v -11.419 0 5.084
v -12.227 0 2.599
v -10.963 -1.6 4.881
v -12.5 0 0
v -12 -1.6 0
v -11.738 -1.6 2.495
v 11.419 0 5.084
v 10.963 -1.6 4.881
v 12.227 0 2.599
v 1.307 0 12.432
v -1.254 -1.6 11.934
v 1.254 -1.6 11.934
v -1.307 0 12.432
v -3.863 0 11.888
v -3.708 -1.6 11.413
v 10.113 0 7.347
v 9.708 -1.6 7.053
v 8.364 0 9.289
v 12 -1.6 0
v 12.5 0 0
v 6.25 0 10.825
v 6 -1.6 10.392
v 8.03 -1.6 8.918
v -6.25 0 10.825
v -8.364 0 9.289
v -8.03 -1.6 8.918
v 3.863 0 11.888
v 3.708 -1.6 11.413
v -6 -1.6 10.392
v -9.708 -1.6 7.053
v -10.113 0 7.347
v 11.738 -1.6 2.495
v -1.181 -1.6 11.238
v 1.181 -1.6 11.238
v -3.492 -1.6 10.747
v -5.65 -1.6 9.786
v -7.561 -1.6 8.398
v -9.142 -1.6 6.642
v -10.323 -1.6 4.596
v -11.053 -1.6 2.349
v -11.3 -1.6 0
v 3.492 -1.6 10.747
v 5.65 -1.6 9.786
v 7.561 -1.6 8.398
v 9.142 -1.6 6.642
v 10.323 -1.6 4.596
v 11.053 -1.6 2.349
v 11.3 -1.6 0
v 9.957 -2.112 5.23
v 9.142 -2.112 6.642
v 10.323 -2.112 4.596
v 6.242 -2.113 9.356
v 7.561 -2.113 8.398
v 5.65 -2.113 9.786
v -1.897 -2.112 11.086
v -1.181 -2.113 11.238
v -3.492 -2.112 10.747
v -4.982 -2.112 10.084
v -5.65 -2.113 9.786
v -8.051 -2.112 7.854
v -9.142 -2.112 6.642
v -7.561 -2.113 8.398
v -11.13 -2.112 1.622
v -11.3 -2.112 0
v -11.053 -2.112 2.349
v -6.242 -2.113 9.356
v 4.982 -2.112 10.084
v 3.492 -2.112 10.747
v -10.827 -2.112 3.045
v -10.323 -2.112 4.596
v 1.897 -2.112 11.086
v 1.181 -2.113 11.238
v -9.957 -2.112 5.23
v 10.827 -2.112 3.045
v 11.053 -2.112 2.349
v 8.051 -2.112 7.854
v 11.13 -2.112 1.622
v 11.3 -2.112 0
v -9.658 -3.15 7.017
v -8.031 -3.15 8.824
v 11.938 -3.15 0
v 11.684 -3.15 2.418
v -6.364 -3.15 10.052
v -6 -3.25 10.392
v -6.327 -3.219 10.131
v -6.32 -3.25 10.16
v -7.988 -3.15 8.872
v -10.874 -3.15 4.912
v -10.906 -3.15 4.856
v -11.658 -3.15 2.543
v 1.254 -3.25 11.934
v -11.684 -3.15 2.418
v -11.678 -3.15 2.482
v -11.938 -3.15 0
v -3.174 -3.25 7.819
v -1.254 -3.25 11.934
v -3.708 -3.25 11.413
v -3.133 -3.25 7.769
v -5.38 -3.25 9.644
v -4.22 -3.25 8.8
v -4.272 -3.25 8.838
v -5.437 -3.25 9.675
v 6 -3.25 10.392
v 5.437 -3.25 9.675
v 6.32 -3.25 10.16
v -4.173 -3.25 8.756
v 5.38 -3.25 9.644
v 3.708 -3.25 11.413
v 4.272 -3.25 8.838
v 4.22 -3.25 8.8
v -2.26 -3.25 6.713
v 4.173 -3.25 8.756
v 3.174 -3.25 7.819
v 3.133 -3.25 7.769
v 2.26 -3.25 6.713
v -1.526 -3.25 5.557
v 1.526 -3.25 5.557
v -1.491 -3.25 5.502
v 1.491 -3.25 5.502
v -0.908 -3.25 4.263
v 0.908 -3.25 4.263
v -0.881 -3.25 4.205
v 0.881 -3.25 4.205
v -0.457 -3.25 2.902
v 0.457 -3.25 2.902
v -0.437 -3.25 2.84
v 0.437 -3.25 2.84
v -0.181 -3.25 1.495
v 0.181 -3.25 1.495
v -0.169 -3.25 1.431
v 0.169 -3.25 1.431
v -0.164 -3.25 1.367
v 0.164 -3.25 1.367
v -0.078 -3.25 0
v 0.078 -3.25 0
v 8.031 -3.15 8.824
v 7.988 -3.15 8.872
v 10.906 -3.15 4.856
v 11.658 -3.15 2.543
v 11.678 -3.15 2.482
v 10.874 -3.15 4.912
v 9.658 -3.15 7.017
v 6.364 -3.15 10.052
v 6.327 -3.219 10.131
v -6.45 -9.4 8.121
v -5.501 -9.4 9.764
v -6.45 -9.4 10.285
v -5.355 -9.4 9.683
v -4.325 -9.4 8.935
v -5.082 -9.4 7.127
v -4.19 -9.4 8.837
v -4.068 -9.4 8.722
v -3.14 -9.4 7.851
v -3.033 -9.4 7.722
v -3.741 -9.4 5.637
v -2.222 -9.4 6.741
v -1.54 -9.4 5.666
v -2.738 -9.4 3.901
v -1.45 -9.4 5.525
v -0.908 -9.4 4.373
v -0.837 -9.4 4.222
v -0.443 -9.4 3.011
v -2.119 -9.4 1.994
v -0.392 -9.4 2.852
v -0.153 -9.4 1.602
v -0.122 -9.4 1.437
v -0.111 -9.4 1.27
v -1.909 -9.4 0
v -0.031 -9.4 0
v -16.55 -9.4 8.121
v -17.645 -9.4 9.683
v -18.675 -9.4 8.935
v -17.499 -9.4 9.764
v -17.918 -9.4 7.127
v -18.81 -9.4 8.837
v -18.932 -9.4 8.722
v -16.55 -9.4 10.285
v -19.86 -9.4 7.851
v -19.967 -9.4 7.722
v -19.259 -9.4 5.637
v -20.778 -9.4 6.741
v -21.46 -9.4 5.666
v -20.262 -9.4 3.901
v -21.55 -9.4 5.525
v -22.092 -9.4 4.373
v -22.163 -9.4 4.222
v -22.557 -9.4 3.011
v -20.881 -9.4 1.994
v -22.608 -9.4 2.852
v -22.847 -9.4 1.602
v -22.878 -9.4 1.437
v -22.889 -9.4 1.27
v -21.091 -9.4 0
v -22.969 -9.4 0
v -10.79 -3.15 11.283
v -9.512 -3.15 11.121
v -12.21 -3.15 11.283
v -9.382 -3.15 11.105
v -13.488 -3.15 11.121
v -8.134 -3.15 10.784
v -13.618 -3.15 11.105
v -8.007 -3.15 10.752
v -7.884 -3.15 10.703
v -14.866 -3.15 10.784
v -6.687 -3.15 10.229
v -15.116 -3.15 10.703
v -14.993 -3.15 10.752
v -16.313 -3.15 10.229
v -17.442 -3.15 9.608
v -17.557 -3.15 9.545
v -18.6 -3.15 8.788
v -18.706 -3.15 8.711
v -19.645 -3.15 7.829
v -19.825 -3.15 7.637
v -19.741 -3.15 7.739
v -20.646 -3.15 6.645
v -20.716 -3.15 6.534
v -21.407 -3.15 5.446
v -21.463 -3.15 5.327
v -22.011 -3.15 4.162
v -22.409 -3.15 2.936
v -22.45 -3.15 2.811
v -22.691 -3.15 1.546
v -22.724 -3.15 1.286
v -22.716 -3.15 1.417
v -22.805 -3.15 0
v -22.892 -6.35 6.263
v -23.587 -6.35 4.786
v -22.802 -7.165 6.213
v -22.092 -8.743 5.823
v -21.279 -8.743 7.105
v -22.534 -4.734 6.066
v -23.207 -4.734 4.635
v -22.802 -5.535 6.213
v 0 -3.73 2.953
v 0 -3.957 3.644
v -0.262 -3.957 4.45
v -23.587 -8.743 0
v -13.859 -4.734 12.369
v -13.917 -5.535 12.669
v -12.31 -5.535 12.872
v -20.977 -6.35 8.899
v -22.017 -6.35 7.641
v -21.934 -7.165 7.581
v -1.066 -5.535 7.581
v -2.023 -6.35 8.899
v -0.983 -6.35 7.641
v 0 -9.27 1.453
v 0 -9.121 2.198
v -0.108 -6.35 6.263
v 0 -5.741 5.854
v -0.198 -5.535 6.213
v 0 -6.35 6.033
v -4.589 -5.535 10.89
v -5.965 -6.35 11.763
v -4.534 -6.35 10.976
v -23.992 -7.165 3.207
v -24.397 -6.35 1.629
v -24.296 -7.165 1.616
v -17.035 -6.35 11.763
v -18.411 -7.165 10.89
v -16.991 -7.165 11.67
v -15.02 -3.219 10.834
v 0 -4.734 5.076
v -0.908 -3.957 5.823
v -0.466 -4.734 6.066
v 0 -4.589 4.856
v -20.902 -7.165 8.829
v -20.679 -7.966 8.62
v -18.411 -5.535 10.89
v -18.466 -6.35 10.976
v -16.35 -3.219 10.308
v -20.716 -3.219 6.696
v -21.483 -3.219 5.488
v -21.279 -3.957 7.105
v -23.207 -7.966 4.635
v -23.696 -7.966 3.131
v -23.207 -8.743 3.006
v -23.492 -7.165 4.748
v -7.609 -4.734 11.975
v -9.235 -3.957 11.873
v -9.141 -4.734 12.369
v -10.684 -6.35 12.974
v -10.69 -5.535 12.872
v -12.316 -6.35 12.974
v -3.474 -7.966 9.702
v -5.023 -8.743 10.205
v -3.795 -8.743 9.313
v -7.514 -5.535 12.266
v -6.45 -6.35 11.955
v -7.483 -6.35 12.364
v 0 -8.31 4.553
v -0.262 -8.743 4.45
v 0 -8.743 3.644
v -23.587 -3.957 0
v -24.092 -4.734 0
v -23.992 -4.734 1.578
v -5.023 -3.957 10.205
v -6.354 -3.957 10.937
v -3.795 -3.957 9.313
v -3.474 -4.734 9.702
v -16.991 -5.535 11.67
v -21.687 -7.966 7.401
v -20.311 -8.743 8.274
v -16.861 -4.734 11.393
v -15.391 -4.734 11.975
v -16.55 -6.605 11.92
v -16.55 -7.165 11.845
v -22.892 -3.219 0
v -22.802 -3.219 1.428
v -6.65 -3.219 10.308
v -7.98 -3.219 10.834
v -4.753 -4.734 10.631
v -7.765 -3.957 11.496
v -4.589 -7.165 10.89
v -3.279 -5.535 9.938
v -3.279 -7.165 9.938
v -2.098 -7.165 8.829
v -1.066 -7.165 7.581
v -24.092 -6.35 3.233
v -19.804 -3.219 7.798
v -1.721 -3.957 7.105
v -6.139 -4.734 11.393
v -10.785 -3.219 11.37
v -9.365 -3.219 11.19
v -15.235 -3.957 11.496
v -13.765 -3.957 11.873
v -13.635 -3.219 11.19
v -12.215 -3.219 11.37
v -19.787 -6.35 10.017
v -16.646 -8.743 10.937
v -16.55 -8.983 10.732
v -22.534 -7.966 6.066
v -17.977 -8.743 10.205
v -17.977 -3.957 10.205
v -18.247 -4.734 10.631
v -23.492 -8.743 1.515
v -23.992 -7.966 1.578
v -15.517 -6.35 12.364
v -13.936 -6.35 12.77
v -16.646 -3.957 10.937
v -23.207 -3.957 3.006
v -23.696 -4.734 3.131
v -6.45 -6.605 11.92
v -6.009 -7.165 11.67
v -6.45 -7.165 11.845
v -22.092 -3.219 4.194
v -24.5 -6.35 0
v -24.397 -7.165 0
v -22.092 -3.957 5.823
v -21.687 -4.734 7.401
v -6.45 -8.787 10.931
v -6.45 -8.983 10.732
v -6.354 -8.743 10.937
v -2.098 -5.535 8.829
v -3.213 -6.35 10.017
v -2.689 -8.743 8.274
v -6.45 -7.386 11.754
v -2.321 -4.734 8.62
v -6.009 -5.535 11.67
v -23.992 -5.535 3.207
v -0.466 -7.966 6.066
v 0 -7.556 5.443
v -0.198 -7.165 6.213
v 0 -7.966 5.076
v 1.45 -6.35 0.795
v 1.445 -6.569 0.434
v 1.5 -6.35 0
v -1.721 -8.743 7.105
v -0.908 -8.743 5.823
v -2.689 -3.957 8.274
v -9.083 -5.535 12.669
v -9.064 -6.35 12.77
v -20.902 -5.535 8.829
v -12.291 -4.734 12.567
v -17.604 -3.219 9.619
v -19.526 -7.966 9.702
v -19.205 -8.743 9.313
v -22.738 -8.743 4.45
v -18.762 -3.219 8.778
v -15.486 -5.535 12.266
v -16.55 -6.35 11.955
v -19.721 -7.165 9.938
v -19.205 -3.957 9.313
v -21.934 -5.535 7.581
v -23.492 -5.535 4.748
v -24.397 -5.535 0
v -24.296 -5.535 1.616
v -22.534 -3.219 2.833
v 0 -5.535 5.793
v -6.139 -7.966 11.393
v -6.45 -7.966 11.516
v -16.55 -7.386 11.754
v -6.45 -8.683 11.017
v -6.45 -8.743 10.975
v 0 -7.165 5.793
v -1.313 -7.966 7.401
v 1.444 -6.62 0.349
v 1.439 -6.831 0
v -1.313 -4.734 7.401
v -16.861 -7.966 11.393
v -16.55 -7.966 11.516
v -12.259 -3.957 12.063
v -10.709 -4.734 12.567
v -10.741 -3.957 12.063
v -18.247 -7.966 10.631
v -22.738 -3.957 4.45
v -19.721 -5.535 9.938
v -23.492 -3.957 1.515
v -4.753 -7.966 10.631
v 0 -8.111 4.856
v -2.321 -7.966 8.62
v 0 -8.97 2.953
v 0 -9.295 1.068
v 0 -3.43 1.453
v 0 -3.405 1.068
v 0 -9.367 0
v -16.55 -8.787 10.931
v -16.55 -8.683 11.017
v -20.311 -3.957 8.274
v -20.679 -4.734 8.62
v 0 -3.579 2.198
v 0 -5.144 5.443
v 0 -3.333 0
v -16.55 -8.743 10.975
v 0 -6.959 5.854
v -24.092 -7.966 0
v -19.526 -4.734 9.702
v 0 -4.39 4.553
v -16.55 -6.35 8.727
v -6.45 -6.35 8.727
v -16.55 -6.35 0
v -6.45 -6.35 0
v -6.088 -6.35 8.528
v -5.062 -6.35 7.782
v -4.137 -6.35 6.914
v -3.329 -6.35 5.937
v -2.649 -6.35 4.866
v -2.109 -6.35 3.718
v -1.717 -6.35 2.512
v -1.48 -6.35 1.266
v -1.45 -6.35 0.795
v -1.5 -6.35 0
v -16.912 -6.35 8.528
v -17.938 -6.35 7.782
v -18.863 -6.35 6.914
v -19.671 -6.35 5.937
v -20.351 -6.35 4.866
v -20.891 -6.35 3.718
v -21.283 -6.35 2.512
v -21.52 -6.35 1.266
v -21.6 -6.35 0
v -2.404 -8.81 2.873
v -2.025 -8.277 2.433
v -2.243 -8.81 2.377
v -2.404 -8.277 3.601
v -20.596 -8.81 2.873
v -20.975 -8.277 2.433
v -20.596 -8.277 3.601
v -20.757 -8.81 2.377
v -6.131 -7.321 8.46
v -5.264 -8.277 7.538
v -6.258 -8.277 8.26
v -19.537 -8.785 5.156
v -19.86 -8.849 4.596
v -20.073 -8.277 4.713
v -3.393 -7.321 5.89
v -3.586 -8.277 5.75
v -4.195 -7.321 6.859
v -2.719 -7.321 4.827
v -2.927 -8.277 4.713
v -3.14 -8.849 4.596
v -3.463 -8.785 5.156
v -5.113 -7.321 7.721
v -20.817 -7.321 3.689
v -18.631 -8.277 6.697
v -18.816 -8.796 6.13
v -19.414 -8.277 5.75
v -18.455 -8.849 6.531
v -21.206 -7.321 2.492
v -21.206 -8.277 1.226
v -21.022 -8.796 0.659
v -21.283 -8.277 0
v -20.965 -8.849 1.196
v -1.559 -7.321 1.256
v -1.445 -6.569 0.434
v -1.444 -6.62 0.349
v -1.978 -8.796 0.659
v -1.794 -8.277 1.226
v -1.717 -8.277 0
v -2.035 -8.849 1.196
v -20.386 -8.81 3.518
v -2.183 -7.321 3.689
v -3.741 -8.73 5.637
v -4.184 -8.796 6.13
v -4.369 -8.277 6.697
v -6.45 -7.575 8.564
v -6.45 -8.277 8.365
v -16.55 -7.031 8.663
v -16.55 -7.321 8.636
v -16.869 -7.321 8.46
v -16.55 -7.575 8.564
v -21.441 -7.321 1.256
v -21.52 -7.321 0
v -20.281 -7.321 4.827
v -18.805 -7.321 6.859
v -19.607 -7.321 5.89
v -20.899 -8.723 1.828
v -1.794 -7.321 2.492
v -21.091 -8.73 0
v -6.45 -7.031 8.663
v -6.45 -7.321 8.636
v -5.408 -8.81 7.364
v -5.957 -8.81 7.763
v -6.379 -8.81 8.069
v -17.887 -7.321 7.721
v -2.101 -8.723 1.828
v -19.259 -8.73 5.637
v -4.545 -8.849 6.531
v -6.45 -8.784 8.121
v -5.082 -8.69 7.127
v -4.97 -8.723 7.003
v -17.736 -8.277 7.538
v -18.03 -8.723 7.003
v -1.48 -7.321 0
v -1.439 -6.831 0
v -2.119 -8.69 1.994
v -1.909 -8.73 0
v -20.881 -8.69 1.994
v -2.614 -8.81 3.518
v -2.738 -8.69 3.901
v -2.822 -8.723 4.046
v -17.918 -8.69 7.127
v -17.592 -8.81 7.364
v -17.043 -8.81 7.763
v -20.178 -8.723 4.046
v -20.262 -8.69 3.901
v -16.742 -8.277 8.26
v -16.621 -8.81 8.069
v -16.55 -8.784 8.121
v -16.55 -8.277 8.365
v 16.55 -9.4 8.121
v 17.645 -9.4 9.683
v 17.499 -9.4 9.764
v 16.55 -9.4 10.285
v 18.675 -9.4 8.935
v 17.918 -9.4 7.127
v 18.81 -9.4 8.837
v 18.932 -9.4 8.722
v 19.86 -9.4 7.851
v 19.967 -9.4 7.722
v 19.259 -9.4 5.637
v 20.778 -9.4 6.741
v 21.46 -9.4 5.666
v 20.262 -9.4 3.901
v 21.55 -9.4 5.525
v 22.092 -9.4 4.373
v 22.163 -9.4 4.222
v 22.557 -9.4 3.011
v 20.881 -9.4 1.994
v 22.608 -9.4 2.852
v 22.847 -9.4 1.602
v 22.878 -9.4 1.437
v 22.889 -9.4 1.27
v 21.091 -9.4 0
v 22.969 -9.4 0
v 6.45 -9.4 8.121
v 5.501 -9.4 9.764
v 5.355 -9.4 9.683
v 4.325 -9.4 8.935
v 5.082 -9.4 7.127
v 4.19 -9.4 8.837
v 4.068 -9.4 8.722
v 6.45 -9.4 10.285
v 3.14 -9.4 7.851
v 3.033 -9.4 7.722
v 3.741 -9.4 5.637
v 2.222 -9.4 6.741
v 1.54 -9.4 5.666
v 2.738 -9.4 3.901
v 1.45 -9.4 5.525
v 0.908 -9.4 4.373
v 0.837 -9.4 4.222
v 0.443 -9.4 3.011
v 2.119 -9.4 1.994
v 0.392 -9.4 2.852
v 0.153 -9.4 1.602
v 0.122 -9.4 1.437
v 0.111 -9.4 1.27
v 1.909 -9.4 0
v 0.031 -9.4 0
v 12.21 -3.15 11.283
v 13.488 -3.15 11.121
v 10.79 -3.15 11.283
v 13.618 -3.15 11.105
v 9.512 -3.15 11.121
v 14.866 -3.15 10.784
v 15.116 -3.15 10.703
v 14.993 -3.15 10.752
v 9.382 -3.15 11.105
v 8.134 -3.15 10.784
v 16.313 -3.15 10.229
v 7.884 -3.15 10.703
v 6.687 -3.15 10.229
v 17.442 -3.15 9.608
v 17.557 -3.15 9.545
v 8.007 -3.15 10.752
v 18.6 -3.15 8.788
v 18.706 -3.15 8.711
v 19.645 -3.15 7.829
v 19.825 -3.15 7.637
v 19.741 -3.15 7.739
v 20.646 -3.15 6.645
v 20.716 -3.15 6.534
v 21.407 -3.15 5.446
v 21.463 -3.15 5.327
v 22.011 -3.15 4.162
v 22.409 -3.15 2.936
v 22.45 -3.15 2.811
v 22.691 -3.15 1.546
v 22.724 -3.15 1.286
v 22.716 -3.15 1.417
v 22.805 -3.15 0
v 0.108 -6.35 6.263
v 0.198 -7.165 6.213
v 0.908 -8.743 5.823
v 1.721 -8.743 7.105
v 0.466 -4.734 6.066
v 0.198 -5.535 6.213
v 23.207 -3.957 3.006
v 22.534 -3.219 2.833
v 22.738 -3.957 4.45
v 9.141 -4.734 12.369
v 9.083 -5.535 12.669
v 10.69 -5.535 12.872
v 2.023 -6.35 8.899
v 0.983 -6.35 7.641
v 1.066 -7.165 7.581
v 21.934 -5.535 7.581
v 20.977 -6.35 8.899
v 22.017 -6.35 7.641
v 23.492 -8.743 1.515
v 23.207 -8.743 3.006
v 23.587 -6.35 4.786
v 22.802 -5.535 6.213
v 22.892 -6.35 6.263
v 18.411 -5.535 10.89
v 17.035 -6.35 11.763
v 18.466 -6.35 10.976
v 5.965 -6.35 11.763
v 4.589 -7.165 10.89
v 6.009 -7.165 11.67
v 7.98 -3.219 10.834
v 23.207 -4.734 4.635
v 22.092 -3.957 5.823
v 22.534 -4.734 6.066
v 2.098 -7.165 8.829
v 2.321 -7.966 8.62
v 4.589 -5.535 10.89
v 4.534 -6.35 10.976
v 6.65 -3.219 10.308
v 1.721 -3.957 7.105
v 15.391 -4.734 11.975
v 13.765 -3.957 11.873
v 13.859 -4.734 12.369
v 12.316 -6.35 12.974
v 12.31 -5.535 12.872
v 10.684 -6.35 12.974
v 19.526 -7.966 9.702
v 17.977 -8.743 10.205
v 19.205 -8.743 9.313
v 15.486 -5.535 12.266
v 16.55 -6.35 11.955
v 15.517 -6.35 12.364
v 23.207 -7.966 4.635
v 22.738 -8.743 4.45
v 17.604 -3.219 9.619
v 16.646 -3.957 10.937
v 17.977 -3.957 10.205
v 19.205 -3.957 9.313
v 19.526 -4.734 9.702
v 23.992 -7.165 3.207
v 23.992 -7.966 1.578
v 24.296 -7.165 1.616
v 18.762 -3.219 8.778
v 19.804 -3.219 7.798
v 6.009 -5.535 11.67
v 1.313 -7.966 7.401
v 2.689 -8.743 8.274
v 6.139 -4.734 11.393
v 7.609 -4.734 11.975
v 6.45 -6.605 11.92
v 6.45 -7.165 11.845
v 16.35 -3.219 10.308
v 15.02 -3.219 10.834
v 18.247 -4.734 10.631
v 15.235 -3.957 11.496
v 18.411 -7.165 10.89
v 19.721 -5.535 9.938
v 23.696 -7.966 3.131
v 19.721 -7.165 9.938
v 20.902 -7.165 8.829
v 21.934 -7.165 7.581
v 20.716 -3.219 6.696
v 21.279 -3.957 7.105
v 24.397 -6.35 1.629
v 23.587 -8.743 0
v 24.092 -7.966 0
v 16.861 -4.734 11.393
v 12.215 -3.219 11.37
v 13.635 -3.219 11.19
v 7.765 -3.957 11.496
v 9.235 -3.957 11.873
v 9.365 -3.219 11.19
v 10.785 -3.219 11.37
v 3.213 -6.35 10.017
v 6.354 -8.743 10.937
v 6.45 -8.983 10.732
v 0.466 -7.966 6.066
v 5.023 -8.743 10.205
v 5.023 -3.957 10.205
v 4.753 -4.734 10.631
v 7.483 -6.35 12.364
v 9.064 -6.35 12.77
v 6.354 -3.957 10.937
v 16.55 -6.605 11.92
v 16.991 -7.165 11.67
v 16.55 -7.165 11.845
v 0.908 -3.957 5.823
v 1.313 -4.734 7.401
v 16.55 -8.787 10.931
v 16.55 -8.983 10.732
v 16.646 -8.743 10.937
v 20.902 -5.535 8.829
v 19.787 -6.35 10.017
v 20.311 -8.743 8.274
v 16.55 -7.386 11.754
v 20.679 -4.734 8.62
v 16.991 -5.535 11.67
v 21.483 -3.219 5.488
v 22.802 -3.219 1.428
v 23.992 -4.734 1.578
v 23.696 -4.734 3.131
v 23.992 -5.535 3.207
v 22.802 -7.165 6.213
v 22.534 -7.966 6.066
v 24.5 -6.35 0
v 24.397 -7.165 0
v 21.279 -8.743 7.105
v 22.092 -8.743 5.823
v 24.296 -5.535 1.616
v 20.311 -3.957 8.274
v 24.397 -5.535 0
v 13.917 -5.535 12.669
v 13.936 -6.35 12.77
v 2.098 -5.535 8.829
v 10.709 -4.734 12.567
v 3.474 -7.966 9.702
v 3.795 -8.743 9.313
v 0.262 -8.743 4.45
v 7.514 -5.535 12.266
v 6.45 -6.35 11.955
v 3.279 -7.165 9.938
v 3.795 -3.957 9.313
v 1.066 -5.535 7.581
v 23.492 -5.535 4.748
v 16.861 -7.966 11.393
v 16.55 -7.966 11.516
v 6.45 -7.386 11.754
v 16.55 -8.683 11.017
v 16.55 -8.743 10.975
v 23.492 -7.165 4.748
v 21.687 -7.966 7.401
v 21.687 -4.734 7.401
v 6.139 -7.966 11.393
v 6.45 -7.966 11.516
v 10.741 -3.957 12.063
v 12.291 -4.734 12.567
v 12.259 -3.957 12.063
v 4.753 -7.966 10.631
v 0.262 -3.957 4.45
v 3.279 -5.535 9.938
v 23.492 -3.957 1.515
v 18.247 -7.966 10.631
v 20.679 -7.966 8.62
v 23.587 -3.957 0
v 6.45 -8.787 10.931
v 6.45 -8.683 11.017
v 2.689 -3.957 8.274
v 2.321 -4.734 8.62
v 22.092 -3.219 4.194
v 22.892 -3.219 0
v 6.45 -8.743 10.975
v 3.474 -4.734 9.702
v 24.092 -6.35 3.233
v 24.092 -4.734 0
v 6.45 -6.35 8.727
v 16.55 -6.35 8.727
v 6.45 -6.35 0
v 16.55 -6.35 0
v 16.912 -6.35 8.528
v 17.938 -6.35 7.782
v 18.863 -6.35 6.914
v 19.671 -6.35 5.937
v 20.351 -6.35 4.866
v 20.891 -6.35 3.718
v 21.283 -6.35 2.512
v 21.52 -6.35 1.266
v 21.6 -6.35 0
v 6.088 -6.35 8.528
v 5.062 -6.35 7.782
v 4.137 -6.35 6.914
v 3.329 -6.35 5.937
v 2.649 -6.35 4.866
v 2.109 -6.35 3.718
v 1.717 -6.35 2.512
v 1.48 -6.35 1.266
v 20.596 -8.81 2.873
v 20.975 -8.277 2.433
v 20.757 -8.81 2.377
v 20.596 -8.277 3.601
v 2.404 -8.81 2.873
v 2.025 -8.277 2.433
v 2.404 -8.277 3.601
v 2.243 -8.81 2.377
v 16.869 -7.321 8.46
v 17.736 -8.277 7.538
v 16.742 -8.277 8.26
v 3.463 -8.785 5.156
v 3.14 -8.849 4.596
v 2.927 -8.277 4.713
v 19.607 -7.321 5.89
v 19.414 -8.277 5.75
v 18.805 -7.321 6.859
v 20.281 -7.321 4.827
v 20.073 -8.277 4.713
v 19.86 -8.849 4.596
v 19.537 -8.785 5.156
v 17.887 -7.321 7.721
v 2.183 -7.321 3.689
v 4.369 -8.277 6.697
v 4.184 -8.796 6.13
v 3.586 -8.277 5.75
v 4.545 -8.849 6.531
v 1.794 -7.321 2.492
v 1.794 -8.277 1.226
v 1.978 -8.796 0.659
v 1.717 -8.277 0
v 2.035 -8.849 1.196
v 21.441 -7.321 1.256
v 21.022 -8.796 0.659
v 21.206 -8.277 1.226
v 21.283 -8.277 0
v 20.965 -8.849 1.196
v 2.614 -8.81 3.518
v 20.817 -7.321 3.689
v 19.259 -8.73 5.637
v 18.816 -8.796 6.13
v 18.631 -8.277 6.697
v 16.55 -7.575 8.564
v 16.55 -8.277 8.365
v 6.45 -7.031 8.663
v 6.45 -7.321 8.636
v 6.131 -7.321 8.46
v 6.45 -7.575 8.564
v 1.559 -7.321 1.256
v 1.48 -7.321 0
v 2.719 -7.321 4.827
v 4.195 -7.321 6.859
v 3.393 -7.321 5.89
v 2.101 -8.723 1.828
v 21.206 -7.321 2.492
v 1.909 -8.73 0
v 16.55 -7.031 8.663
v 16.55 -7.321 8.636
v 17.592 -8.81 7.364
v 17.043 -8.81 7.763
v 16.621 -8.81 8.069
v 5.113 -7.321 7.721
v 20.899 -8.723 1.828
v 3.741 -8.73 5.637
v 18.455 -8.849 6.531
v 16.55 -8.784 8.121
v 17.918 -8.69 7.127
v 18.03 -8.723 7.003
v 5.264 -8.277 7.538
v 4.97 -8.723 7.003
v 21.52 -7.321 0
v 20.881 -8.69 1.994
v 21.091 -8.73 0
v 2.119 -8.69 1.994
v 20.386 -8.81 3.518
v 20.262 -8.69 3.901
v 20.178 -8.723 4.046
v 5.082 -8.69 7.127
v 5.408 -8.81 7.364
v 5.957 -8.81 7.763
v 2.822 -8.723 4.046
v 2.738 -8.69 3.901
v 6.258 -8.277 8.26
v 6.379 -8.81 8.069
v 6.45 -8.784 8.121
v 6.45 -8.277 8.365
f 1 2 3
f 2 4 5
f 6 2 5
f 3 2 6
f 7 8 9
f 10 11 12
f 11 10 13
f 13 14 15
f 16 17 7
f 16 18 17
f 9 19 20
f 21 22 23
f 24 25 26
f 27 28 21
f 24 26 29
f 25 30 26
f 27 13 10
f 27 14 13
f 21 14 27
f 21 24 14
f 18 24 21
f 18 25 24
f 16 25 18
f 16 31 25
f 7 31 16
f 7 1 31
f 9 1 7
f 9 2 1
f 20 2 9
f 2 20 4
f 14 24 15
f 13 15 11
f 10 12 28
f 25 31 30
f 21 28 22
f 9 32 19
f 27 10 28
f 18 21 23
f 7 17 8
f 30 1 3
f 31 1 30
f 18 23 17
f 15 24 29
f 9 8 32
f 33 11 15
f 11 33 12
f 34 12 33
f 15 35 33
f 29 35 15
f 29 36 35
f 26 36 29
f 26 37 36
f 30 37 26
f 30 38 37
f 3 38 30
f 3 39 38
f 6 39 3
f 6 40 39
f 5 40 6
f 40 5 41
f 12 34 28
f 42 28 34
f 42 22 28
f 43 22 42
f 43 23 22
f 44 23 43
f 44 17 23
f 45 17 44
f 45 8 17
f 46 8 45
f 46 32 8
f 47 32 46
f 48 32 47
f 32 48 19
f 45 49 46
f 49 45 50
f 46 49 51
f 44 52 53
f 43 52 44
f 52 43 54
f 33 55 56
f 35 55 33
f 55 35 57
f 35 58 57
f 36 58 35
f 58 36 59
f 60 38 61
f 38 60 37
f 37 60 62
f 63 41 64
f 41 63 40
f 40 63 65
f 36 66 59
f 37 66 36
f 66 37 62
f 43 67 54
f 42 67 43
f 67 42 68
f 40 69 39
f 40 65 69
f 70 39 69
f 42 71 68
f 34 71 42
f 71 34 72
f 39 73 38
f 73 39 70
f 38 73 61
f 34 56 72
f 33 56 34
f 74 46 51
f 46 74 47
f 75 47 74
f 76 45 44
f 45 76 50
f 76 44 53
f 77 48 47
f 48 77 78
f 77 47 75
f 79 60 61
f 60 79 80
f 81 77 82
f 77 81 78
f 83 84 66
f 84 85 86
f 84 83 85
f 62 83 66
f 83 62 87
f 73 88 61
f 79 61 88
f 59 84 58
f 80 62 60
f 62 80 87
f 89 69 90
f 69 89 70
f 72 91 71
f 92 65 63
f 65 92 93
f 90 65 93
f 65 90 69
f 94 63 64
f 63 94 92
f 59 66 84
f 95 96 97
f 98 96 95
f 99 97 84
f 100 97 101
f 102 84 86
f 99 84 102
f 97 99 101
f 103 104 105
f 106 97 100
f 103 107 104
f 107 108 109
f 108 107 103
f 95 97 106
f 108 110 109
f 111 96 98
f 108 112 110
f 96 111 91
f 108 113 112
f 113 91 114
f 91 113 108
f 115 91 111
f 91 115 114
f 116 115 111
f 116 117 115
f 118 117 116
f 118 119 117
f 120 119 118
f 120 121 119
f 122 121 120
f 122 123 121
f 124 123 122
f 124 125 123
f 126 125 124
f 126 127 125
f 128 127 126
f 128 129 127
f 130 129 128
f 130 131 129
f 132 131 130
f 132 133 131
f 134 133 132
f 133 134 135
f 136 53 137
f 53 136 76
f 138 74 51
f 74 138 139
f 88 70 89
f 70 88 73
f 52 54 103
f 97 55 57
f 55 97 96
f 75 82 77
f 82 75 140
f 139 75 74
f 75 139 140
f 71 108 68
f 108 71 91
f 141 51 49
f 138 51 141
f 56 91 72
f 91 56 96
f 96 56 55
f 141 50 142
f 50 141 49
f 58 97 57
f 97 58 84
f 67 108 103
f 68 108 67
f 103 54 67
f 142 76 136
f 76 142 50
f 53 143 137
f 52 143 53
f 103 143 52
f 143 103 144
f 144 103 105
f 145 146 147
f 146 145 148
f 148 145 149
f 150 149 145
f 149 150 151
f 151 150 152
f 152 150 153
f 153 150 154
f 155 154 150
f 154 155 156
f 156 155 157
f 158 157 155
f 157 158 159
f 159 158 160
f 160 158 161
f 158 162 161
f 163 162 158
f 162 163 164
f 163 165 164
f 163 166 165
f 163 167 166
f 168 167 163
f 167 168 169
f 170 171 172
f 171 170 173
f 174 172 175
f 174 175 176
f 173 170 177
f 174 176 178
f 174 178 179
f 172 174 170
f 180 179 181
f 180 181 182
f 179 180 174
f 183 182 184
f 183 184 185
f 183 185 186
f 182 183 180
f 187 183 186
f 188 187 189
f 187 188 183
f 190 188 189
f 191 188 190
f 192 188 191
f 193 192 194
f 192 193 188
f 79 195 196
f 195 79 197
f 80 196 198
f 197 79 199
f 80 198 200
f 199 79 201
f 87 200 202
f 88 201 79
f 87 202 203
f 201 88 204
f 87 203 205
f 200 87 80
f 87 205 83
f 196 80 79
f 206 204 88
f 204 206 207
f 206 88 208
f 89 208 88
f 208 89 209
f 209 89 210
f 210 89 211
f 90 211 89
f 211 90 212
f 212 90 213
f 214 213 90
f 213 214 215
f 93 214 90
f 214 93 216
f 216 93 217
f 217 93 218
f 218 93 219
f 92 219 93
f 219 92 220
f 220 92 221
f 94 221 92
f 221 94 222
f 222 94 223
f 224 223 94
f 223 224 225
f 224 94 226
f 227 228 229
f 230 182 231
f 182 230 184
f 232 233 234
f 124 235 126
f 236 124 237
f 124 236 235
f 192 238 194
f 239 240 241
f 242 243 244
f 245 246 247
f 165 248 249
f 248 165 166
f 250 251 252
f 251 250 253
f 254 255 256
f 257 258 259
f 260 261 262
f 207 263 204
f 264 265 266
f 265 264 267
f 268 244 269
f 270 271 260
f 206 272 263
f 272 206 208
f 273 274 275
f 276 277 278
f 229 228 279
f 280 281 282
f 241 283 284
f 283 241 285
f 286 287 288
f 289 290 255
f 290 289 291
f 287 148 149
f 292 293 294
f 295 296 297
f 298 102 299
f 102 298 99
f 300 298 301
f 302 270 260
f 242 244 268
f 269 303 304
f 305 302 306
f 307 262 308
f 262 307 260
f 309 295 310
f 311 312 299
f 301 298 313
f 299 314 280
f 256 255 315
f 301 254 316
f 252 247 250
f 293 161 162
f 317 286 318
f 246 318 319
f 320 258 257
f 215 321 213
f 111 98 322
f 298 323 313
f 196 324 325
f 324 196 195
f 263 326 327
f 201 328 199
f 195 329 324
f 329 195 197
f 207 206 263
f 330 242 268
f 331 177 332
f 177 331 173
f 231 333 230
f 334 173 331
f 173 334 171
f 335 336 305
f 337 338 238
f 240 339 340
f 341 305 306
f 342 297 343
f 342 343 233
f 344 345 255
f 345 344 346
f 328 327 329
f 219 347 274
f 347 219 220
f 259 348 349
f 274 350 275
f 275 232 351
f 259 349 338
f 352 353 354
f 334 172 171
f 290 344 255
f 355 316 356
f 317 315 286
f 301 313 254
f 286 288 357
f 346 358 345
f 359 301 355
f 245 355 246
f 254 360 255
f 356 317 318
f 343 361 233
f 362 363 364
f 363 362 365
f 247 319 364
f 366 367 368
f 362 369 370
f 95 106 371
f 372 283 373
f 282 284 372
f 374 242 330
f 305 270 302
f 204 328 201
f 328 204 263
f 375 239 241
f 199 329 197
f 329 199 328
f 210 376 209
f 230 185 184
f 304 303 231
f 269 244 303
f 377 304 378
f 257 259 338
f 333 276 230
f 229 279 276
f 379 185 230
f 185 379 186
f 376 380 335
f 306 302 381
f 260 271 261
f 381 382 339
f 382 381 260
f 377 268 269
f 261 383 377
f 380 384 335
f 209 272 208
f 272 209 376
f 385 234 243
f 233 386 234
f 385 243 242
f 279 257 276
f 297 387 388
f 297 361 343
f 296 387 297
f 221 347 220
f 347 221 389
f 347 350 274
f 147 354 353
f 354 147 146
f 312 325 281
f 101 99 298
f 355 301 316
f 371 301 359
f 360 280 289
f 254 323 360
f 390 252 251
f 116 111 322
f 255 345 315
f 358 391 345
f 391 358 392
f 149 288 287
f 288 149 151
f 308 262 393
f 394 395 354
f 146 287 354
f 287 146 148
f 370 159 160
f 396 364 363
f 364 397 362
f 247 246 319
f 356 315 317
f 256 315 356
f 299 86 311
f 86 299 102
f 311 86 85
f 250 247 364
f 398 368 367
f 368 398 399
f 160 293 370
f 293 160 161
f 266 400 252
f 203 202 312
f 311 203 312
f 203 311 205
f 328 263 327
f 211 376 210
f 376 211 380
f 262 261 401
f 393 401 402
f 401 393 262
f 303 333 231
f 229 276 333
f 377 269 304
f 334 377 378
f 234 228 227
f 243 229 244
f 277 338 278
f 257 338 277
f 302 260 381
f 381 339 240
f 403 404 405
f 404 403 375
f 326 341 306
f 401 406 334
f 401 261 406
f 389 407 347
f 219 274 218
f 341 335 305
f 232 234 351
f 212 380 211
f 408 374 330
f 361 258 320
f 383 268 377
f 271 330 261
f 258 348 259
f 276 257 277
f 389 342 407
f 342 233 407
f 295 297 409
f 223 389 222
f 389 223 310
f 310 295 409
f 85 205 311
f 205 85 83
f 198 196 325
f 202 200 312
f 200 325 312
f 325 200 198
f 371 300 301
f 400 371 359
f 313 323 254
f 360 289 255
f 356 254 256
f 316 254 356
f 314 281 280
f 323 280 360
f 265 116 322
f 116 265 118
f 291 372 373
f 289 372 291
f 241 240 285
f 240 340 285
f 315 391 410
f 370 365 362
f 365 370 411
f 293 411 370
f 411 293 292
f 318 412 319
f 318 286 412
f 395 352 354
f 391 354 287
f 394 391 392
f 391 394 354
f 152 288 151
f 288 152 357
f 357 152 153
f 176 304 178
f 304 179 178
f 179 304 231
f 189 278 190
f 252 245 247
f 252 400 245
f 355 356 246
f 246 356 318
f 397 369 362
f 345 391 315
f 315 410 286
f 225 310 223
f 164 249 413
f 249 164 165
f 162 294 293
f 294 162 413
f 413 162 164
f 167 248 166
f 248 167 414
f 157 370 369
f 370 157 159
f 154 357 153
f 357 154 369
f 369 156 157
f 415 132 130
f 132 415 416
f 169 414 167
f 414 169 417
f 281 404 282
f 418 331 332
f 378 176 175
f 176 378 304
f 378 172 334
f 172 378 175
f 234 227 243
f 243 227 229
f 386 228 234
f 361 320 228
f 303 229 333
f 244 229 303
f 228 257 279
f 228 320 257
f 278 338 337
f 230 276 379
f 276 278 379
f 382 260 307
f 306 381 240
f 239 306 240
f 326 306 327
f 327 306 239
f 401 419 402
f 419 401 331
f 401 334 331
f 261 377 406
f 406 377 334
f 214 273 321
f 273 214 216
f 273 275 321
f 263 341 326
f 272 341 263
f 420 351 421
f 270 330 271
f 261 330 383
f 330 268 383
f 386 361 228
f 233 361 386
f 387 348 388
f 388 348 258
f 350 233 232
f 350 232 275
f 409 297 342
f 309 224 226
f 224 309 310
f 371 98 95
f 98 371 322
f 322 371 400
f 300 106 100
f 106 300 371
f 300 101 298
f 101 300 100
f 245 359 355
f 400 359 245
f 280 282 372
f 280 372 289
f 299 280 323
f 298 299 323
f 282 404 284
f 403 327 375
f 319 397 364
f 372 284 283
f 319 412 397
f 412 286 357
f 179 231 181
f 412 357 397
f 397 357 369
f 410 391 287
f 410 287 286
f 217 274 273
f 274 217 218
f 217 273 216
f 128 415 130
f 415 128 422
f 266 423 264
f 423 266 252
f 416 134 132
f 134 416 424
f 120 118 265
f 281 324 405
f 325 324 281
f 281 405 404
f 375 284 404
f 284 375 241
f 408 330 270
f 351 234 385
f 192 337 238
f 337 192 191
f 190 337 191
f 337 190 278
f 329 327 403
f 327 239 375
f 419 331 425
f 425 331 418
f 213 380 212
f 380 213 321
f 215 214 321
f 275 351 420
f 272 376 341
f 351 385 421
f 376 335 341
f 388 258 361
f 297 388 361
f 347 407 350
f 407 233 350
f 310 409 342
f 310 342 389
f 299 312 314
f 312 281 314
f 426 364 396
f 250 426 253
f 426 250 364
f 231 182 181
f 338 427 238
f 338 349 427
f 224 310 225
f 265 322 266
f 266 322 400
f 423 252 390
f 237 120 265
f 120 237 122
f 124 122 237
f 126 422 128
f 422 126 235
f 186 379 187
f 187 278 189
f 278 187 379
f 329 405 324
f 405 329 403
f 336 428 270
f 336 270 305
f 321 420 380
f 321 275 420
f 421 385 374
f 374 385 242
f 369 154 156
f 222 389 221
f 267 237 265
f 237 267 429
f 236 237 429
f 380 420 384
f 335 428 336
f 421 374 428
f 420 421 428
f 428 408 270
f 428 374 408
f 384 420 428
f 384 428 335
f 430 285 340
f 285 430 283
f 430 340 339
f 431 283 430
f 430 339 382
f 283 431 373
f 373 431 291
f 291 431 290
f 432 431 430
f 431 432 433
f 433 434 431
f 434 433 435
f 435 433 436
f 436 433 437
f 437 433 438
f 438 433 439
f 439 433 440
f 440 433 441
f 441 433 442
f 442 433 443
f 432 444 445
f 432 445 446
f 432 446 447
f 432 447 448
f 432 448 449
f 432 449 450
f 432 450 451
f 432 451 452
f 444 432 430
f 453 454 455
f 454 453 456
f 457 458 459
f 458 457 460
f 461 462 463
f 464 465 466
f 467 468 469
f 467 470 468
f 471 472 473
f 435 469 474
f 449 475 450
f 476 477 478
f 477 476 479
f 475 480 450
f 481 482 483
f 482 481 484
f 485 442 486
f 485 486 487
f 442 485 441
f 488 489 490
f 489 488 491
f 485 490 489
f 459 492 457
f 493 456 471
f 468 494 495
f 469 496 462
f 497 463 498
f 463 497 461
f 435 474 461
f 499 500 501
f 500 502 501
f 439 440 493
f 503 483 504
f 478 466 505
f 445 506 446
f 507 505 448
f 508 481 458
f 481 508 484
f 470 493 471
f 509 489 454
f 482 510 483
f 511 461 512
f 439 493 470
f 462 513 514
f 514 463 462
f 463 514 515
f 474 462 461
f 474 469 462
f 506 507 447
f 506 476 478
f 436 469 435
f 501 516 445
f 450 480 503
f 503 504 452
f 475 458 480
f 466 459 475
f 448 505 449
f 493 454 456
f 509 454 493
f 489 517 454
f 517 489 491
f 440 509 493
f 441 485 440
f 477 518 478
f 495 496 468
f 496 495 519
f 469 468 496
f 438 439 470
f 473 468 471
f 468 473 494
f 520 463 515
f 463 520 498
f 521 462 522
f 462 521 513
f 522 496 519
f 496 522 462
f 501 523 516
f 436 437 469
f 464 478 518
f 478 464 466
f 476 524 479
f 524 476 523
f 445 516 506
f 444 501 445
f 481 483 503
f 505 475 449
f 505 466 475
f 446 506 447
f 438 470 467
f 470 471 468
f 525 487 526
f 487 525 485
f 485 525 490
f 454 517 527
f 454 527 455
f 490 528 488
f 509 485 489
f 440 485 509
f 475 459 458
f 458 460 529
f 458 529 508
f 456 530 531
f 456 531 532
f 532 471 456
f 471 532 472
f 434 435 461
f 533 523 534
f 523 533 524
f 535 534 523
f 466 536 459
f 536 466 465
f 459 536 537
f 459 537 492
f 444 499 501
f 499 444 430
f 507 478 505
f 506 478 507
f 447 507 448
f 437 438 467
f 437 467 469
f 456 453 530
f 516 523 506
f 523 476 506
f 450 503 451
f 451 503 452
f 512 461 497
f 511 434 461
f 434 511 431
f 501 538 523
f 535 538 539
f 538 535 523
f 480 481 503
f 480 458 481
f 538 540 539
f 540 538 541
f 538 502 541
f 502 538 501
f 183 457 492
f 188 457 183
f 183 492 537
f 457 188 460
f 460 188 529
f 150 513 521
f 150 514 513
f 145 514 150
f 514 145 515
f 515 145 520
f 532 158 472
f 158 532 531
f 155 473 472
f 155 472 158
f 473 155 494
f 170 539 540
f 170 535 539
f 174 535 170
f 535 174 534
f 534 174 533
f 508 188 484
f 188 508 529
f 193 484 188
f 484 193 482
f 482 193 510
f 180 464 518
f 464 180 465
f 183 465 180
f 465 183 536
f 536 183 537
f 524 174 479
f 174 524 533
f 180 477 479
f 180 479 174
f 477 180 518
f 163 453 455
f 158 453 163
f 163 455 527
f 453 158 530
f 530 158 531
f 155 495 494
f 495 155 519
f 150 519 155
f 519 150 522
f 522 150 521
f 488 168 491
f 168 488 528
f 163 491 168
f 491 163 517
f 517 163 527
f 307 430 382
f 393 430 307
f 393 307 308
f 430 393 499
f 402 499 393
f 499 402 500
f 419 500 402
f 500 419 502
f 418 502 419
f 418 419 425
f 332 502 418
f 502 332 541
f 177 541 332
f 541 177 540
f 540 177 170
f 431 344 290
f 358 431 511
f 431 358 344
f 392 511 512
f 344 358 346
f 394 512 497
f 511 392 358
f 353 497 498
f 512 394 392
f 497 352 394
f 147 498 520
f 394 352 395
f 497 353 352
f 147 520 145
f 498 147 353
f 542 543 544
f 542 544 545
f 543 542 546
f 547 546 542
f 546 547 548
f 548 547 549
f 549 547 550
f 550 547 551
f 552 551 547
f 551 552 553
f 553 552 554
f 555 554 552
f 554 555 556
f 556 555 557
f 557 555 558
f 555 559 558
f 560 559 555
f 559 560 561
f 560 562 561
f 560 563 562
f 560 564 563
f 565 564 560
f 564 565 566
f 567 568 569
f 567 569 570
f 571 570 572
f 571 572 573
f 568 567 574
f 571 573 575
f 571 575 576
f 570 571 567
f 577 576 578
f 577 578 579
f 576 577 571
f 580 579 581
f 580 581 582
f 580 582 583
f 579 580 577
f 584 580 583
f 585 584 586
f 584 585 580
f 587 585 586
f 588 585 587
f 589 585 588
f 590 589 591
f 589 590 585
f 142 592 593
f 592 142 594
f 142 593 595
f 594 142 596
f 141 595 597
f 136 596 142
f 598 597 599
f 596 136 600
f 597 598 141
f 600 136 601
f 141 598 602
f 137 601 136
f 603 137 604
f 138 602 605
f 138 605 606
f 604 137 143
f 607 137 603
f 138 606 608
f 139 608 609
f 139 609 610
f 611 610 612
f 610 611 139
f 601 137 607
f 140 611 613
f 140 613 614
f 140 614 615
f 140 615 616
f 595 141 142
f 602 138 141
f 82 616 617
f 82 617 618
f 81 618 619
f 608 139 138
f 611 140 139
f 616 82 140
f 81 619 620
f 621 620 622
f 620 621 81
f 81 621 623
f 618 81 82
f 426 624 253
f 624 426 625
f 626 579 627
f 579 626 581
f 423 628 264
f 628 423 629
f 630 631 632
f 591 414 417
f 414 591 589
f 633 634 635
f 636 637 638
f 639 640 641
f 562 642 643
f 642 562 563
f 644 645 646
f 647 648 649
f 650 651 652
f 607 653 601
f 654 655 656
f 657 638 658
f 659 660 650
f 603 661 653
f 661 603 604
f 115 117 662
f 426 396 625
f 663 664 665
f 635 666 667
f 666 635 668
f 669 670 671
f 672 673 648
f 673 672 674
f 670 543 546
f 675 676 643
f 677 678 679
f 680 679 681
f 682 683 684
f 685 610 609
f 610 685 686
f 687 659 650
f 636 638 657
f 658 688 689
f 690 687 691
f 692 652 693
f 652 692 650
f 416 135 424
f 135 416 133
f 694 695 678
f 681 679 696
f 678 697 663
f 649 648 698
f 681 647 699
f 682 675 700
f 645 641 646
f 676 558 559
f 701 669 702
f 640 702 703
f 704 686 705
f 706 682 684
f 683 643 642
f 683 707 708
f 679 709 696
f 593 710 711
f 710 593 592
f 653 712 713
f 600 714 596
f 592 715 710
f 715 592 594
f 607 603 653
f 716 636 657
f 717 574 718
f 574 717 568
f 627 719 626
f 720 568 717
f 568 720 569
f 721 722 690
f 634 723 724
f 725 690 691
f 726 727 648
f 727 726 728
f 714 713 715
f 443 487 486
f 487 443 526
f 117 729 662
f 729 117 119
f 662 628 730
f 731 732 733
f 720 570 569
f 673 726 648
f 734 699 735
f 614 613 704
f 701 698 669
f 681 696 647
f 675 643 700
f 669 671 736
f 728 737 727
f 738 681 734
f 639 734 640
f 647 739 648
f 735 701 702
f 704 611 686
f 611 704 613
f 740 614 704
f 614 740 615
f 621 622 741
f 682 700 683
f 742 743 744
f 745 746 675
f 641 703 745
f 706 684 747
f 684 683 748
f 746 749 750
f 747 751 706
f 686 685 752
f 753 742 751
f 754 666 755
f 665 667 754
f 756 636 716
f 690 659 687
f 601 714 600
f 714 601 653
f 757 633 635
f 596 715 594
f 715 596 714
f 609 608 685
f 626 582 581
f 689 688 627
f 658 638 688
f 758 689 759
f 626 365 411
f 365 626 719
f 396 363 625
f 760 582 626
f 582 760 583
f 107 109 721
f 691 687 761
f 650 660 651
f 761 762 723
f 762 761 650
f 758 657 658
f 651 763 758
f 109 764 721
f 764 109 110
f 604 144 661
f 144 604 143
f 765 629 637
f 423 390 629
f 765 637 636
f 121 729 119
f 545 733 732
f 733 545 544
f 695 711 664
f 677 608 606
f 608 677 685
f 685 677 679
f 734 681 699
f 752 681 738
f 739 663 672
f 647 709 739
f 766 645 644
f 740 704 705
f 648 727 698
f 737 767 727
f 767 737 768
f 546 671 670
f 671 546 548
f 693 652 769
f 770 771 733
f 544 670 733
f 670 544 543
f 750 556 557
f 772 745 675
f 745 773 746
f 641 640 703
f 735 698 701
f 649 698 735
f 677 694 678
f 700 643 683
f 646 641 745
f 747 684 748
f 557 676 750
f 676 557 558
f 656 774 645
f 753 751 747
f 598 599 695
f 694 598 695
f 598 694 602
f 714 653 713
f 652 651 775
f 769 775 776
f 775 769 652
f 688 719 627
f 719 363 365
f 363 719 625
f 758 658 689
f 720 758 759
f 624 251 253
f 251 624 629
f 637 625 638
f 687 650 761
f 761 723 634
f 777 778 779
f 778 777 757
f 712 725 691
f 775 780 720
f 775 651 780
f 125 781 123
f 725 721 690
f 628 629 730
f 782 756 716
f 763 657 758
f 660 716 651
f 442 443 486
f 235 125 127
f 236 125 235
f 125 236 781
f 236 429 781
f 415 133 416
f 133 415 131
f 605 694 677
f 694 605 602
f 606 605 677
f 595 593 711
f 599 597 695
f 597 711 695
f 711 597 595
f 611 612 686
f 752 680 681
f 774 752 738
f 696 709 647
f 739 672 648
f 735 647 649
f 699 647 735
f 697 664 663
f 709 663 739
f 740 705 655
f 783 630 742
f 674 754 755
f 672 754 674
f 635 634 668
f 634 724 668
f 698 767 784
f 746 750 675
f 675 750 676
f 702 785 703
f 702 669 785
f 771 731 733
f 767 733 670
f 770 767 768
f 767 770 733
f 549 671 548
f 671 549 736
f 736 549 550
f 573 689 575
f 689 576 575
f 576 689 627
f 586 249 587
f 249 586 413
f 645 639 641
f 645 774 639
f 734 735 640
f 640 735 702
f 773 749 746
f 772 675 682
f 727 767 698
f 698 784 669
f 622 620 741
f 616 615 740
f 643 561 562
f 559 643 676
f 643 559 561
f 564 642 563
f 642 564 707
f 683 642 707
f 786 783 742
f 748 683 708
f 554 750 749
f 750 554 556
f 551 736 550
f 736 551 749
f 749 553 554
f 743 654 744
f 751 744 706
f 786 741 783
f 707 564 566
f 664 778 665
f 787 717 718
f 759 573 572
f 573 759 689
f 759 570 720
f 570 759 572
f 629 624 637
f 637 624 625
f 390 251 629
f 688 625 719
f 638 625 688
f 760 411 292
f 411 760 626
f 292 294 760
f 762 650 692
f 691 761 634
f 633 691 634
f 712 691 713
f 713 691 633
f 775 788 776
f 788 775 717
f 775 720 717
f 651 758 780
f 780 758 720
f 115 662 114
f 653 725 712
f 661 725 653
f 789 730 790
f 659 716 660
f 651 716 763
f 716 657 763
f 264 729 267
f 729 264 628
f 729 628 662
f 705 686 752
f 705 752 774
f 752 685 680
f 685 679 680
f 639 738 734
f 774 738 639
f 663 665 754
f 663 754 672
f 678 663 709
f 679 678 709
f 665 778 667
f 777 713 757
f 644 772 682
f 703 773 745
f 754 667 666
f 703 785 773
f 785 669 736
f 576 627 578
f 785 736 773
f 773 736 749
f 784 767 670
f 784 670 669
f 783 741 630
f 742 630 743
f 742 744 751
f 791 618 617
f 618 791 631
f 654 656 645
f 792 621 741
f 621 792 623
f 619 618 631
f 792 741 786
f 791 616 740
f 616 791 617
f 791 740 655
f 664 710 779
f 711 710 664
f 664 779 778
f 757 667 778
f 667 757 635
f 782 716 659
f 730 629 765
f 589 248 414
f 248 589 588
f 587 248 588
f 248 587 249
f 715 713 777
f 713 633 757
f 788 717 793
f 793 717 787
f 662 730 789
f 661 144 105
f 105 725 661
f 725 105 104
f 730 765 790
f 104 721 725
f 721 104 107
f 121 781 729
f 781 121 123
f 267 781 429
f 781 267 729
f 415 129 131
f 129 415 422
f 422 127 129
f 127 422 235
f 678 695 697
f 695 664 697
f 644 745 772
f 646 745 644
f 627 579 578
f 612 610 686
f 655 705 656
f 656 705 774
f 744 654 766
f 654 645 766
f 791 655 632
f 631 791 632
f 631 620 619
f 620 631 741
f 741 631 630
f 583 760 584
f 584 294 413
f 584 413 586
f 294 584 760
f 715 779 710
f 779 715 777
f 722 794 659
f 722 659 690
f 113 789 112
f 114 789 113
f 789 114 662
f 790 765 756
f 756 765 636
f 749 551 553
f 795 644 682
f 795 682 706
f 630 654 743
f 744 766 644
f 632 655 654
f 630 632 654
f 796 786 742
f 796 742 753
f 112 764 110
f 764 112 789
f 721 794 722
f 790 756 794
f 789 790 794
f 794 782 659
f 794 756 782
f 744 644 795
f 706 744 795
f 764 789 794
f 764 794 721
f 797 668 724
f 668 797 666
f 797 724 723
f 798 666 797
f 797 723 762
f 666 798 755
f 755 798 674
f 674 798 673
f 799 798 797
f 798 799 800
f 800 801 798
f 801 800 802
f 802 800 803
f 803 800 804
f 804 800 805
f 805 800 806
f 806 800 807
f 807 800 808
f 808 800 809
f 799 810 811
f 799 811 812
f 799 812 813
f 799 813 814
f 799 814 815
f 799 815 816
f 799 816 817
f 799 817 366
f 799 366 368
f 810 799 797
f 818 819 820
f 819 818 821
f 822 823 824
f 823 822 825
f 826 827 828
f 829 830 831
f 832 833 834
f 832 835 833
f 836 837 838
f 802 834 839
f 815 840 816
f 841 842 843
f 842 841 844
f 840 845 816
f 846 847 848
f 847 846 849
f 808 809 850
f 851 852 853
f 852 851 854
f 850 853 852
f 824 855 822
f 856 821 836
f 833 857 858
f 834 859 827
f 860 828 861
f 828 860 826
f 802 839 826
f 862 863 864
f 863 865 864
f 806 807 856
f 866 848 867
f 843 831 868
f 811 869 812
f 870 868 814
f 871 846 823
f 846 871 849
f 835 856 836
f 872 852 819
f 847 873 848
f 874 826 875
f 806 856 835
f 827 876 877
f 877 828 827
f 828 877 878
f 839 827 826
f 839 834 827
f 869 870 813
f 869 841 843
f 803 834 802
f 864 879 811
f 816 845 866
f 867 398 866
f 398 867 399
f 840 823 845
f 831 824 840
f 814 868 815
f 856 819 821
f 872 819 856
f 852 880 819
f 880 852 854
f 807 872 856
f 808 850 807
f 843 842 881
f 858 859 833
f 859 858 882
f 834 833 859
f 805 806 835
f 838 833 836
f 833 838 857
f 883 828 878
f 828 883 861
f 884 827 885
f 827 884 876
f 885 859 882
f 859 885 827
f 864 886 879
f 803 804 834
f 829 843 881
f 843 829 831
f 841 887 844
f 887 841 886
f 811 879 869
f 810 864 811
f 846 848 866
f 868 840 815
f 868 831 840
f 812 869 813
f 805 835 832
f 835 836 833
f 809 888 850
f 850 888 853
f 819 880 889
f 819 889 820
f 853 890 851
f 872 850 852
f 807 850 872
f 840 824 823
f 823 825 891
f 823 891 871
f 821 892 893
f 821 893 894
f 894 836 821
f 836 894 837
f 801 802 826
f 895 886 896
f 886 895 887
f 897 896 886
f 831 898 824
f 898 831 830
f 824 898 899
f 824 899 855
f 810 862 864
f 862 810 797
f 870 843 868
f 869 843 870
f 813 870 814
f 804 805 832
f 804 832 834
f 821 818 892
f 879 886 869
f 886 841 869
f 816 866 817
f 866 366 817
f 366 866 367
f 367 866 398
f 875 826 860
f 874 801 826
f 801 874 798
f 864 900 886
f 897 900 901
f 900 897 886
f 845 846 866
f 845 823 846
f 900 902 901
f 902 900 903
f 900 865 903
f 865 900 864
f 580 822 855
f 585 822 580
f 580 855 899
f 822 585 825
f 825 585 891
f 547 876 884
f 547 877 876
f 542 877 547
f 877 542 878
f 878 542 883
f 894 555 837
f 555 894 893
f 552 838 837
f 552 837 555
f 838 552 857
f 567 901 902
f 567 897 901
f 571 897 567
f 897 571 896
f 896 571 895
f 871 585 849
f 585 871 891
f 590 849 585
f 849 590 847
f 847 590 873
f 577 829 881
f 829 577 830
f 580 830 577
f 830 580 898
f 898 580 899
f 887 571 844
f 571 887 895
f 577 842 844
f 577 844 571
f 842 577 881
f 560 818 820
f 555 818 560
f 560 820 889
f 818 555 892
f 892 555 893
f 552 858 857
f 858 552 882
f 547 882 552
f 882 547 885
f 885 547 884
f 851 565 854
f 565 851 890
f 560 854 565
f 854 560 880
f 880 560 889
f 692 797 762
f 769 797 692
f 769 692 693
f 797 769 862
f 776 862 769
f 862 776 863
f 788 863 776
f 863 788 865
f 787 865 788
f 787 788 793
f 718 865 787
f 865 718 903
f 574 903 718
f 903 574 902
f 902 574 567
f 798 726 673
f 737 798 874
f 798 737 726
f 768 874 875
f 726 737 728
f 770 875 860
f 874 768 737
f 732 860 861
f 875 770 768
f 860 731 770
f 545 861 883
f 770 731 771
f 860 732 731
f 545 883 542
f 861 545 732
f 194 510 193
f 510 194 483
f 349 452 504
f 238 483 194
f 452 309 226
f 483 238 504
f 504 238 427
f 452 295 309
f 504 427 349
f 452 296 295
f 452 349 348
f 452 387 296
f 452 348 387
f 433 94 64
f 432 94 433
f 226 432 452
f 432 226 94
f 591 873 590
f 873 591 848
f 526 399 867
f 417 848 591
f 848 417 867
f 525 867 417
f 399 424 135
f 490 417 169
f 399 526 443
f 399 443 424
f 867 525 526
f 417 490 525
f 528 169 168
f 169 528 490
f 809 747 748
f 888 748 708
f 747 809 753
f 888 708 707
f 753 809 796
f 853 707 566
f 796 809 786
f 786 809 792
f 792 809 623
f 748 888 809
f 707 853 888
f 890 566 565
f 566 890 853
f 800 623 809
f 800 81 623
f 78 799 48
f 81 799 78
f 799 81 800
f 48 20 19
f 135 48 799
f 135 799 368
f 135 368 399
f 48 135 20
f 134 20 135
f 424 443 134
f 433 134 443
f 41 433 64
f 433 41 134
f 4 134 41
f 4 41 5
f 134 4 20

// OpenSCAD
use <handler_models.scad>

// adapter_type 3486254=compatible with thing:3486254.
// adapter_type=0. not compatible but you don't need adapters for 25mm bases
// adapter_type=1 is a variation of 0, better to print without supports
adapter_type=3486254;
adapter_margin=3; // margin of the adapter around the hole for the mini base

base_w=20; // main diameter of the miniature base
base_w2=0;  // secondary radius for the elliptic miniature base. If 0, it is a circular base
base_h=3.2; // The total height of the miniature base. Make is slightly taller than a real miniature base
tolerance=1.01; // scale the hole by this amount, relative to the size of a base

handler_h=75; // height of the handler
handler_r=15.1; // 15.1 matches thing:3486254

module adapter_double(base_w, base_w2, tolerance=1.02, adapter_type=3486254, adapter_margin=3) {
    if(adapter_type==3486254) {
        adapter_bottom();
    } else {
        // the bottom part is always 25mm
        base_plain(25);
    }
    translate([0, 0, base_h+base_h-0.05]) {
        translate([base_w/2+adapter_margin/2, 0, 0]) adapter_top(base_w, base_w2, tolerance=tolerance, adapter_type=adapter_type, adapter_margin=adapter_margin);
        translate([-base_w/2-adapter_margin/2, 0, 0]) adapter_top(base_w, base_w2, tolerance=tolerance, adapter_type=adapter_type, adapter_margin=adapter_margin);
    }
}
module half_adapter_double(base_w, base_w2, tolerance=1.02, adapter_type=1, adapter_margin=3) {
    difference() {
        rotate([270, 0, 180]) { adapter_double(base_w, base_w2, tolerance=tolerance, adapter_type=adapter_type, adapter_margin=adapter_margin); }
        translate([-base_w*2, -handler_h*1.5, -handler_r*3]) { cube([base_w*4, handler_h*2, handler_r*3]);  }
    }
}

half_adapter_double(base_w, base_w2, tolerance=tolerance, adapter_type=adapter_type);
